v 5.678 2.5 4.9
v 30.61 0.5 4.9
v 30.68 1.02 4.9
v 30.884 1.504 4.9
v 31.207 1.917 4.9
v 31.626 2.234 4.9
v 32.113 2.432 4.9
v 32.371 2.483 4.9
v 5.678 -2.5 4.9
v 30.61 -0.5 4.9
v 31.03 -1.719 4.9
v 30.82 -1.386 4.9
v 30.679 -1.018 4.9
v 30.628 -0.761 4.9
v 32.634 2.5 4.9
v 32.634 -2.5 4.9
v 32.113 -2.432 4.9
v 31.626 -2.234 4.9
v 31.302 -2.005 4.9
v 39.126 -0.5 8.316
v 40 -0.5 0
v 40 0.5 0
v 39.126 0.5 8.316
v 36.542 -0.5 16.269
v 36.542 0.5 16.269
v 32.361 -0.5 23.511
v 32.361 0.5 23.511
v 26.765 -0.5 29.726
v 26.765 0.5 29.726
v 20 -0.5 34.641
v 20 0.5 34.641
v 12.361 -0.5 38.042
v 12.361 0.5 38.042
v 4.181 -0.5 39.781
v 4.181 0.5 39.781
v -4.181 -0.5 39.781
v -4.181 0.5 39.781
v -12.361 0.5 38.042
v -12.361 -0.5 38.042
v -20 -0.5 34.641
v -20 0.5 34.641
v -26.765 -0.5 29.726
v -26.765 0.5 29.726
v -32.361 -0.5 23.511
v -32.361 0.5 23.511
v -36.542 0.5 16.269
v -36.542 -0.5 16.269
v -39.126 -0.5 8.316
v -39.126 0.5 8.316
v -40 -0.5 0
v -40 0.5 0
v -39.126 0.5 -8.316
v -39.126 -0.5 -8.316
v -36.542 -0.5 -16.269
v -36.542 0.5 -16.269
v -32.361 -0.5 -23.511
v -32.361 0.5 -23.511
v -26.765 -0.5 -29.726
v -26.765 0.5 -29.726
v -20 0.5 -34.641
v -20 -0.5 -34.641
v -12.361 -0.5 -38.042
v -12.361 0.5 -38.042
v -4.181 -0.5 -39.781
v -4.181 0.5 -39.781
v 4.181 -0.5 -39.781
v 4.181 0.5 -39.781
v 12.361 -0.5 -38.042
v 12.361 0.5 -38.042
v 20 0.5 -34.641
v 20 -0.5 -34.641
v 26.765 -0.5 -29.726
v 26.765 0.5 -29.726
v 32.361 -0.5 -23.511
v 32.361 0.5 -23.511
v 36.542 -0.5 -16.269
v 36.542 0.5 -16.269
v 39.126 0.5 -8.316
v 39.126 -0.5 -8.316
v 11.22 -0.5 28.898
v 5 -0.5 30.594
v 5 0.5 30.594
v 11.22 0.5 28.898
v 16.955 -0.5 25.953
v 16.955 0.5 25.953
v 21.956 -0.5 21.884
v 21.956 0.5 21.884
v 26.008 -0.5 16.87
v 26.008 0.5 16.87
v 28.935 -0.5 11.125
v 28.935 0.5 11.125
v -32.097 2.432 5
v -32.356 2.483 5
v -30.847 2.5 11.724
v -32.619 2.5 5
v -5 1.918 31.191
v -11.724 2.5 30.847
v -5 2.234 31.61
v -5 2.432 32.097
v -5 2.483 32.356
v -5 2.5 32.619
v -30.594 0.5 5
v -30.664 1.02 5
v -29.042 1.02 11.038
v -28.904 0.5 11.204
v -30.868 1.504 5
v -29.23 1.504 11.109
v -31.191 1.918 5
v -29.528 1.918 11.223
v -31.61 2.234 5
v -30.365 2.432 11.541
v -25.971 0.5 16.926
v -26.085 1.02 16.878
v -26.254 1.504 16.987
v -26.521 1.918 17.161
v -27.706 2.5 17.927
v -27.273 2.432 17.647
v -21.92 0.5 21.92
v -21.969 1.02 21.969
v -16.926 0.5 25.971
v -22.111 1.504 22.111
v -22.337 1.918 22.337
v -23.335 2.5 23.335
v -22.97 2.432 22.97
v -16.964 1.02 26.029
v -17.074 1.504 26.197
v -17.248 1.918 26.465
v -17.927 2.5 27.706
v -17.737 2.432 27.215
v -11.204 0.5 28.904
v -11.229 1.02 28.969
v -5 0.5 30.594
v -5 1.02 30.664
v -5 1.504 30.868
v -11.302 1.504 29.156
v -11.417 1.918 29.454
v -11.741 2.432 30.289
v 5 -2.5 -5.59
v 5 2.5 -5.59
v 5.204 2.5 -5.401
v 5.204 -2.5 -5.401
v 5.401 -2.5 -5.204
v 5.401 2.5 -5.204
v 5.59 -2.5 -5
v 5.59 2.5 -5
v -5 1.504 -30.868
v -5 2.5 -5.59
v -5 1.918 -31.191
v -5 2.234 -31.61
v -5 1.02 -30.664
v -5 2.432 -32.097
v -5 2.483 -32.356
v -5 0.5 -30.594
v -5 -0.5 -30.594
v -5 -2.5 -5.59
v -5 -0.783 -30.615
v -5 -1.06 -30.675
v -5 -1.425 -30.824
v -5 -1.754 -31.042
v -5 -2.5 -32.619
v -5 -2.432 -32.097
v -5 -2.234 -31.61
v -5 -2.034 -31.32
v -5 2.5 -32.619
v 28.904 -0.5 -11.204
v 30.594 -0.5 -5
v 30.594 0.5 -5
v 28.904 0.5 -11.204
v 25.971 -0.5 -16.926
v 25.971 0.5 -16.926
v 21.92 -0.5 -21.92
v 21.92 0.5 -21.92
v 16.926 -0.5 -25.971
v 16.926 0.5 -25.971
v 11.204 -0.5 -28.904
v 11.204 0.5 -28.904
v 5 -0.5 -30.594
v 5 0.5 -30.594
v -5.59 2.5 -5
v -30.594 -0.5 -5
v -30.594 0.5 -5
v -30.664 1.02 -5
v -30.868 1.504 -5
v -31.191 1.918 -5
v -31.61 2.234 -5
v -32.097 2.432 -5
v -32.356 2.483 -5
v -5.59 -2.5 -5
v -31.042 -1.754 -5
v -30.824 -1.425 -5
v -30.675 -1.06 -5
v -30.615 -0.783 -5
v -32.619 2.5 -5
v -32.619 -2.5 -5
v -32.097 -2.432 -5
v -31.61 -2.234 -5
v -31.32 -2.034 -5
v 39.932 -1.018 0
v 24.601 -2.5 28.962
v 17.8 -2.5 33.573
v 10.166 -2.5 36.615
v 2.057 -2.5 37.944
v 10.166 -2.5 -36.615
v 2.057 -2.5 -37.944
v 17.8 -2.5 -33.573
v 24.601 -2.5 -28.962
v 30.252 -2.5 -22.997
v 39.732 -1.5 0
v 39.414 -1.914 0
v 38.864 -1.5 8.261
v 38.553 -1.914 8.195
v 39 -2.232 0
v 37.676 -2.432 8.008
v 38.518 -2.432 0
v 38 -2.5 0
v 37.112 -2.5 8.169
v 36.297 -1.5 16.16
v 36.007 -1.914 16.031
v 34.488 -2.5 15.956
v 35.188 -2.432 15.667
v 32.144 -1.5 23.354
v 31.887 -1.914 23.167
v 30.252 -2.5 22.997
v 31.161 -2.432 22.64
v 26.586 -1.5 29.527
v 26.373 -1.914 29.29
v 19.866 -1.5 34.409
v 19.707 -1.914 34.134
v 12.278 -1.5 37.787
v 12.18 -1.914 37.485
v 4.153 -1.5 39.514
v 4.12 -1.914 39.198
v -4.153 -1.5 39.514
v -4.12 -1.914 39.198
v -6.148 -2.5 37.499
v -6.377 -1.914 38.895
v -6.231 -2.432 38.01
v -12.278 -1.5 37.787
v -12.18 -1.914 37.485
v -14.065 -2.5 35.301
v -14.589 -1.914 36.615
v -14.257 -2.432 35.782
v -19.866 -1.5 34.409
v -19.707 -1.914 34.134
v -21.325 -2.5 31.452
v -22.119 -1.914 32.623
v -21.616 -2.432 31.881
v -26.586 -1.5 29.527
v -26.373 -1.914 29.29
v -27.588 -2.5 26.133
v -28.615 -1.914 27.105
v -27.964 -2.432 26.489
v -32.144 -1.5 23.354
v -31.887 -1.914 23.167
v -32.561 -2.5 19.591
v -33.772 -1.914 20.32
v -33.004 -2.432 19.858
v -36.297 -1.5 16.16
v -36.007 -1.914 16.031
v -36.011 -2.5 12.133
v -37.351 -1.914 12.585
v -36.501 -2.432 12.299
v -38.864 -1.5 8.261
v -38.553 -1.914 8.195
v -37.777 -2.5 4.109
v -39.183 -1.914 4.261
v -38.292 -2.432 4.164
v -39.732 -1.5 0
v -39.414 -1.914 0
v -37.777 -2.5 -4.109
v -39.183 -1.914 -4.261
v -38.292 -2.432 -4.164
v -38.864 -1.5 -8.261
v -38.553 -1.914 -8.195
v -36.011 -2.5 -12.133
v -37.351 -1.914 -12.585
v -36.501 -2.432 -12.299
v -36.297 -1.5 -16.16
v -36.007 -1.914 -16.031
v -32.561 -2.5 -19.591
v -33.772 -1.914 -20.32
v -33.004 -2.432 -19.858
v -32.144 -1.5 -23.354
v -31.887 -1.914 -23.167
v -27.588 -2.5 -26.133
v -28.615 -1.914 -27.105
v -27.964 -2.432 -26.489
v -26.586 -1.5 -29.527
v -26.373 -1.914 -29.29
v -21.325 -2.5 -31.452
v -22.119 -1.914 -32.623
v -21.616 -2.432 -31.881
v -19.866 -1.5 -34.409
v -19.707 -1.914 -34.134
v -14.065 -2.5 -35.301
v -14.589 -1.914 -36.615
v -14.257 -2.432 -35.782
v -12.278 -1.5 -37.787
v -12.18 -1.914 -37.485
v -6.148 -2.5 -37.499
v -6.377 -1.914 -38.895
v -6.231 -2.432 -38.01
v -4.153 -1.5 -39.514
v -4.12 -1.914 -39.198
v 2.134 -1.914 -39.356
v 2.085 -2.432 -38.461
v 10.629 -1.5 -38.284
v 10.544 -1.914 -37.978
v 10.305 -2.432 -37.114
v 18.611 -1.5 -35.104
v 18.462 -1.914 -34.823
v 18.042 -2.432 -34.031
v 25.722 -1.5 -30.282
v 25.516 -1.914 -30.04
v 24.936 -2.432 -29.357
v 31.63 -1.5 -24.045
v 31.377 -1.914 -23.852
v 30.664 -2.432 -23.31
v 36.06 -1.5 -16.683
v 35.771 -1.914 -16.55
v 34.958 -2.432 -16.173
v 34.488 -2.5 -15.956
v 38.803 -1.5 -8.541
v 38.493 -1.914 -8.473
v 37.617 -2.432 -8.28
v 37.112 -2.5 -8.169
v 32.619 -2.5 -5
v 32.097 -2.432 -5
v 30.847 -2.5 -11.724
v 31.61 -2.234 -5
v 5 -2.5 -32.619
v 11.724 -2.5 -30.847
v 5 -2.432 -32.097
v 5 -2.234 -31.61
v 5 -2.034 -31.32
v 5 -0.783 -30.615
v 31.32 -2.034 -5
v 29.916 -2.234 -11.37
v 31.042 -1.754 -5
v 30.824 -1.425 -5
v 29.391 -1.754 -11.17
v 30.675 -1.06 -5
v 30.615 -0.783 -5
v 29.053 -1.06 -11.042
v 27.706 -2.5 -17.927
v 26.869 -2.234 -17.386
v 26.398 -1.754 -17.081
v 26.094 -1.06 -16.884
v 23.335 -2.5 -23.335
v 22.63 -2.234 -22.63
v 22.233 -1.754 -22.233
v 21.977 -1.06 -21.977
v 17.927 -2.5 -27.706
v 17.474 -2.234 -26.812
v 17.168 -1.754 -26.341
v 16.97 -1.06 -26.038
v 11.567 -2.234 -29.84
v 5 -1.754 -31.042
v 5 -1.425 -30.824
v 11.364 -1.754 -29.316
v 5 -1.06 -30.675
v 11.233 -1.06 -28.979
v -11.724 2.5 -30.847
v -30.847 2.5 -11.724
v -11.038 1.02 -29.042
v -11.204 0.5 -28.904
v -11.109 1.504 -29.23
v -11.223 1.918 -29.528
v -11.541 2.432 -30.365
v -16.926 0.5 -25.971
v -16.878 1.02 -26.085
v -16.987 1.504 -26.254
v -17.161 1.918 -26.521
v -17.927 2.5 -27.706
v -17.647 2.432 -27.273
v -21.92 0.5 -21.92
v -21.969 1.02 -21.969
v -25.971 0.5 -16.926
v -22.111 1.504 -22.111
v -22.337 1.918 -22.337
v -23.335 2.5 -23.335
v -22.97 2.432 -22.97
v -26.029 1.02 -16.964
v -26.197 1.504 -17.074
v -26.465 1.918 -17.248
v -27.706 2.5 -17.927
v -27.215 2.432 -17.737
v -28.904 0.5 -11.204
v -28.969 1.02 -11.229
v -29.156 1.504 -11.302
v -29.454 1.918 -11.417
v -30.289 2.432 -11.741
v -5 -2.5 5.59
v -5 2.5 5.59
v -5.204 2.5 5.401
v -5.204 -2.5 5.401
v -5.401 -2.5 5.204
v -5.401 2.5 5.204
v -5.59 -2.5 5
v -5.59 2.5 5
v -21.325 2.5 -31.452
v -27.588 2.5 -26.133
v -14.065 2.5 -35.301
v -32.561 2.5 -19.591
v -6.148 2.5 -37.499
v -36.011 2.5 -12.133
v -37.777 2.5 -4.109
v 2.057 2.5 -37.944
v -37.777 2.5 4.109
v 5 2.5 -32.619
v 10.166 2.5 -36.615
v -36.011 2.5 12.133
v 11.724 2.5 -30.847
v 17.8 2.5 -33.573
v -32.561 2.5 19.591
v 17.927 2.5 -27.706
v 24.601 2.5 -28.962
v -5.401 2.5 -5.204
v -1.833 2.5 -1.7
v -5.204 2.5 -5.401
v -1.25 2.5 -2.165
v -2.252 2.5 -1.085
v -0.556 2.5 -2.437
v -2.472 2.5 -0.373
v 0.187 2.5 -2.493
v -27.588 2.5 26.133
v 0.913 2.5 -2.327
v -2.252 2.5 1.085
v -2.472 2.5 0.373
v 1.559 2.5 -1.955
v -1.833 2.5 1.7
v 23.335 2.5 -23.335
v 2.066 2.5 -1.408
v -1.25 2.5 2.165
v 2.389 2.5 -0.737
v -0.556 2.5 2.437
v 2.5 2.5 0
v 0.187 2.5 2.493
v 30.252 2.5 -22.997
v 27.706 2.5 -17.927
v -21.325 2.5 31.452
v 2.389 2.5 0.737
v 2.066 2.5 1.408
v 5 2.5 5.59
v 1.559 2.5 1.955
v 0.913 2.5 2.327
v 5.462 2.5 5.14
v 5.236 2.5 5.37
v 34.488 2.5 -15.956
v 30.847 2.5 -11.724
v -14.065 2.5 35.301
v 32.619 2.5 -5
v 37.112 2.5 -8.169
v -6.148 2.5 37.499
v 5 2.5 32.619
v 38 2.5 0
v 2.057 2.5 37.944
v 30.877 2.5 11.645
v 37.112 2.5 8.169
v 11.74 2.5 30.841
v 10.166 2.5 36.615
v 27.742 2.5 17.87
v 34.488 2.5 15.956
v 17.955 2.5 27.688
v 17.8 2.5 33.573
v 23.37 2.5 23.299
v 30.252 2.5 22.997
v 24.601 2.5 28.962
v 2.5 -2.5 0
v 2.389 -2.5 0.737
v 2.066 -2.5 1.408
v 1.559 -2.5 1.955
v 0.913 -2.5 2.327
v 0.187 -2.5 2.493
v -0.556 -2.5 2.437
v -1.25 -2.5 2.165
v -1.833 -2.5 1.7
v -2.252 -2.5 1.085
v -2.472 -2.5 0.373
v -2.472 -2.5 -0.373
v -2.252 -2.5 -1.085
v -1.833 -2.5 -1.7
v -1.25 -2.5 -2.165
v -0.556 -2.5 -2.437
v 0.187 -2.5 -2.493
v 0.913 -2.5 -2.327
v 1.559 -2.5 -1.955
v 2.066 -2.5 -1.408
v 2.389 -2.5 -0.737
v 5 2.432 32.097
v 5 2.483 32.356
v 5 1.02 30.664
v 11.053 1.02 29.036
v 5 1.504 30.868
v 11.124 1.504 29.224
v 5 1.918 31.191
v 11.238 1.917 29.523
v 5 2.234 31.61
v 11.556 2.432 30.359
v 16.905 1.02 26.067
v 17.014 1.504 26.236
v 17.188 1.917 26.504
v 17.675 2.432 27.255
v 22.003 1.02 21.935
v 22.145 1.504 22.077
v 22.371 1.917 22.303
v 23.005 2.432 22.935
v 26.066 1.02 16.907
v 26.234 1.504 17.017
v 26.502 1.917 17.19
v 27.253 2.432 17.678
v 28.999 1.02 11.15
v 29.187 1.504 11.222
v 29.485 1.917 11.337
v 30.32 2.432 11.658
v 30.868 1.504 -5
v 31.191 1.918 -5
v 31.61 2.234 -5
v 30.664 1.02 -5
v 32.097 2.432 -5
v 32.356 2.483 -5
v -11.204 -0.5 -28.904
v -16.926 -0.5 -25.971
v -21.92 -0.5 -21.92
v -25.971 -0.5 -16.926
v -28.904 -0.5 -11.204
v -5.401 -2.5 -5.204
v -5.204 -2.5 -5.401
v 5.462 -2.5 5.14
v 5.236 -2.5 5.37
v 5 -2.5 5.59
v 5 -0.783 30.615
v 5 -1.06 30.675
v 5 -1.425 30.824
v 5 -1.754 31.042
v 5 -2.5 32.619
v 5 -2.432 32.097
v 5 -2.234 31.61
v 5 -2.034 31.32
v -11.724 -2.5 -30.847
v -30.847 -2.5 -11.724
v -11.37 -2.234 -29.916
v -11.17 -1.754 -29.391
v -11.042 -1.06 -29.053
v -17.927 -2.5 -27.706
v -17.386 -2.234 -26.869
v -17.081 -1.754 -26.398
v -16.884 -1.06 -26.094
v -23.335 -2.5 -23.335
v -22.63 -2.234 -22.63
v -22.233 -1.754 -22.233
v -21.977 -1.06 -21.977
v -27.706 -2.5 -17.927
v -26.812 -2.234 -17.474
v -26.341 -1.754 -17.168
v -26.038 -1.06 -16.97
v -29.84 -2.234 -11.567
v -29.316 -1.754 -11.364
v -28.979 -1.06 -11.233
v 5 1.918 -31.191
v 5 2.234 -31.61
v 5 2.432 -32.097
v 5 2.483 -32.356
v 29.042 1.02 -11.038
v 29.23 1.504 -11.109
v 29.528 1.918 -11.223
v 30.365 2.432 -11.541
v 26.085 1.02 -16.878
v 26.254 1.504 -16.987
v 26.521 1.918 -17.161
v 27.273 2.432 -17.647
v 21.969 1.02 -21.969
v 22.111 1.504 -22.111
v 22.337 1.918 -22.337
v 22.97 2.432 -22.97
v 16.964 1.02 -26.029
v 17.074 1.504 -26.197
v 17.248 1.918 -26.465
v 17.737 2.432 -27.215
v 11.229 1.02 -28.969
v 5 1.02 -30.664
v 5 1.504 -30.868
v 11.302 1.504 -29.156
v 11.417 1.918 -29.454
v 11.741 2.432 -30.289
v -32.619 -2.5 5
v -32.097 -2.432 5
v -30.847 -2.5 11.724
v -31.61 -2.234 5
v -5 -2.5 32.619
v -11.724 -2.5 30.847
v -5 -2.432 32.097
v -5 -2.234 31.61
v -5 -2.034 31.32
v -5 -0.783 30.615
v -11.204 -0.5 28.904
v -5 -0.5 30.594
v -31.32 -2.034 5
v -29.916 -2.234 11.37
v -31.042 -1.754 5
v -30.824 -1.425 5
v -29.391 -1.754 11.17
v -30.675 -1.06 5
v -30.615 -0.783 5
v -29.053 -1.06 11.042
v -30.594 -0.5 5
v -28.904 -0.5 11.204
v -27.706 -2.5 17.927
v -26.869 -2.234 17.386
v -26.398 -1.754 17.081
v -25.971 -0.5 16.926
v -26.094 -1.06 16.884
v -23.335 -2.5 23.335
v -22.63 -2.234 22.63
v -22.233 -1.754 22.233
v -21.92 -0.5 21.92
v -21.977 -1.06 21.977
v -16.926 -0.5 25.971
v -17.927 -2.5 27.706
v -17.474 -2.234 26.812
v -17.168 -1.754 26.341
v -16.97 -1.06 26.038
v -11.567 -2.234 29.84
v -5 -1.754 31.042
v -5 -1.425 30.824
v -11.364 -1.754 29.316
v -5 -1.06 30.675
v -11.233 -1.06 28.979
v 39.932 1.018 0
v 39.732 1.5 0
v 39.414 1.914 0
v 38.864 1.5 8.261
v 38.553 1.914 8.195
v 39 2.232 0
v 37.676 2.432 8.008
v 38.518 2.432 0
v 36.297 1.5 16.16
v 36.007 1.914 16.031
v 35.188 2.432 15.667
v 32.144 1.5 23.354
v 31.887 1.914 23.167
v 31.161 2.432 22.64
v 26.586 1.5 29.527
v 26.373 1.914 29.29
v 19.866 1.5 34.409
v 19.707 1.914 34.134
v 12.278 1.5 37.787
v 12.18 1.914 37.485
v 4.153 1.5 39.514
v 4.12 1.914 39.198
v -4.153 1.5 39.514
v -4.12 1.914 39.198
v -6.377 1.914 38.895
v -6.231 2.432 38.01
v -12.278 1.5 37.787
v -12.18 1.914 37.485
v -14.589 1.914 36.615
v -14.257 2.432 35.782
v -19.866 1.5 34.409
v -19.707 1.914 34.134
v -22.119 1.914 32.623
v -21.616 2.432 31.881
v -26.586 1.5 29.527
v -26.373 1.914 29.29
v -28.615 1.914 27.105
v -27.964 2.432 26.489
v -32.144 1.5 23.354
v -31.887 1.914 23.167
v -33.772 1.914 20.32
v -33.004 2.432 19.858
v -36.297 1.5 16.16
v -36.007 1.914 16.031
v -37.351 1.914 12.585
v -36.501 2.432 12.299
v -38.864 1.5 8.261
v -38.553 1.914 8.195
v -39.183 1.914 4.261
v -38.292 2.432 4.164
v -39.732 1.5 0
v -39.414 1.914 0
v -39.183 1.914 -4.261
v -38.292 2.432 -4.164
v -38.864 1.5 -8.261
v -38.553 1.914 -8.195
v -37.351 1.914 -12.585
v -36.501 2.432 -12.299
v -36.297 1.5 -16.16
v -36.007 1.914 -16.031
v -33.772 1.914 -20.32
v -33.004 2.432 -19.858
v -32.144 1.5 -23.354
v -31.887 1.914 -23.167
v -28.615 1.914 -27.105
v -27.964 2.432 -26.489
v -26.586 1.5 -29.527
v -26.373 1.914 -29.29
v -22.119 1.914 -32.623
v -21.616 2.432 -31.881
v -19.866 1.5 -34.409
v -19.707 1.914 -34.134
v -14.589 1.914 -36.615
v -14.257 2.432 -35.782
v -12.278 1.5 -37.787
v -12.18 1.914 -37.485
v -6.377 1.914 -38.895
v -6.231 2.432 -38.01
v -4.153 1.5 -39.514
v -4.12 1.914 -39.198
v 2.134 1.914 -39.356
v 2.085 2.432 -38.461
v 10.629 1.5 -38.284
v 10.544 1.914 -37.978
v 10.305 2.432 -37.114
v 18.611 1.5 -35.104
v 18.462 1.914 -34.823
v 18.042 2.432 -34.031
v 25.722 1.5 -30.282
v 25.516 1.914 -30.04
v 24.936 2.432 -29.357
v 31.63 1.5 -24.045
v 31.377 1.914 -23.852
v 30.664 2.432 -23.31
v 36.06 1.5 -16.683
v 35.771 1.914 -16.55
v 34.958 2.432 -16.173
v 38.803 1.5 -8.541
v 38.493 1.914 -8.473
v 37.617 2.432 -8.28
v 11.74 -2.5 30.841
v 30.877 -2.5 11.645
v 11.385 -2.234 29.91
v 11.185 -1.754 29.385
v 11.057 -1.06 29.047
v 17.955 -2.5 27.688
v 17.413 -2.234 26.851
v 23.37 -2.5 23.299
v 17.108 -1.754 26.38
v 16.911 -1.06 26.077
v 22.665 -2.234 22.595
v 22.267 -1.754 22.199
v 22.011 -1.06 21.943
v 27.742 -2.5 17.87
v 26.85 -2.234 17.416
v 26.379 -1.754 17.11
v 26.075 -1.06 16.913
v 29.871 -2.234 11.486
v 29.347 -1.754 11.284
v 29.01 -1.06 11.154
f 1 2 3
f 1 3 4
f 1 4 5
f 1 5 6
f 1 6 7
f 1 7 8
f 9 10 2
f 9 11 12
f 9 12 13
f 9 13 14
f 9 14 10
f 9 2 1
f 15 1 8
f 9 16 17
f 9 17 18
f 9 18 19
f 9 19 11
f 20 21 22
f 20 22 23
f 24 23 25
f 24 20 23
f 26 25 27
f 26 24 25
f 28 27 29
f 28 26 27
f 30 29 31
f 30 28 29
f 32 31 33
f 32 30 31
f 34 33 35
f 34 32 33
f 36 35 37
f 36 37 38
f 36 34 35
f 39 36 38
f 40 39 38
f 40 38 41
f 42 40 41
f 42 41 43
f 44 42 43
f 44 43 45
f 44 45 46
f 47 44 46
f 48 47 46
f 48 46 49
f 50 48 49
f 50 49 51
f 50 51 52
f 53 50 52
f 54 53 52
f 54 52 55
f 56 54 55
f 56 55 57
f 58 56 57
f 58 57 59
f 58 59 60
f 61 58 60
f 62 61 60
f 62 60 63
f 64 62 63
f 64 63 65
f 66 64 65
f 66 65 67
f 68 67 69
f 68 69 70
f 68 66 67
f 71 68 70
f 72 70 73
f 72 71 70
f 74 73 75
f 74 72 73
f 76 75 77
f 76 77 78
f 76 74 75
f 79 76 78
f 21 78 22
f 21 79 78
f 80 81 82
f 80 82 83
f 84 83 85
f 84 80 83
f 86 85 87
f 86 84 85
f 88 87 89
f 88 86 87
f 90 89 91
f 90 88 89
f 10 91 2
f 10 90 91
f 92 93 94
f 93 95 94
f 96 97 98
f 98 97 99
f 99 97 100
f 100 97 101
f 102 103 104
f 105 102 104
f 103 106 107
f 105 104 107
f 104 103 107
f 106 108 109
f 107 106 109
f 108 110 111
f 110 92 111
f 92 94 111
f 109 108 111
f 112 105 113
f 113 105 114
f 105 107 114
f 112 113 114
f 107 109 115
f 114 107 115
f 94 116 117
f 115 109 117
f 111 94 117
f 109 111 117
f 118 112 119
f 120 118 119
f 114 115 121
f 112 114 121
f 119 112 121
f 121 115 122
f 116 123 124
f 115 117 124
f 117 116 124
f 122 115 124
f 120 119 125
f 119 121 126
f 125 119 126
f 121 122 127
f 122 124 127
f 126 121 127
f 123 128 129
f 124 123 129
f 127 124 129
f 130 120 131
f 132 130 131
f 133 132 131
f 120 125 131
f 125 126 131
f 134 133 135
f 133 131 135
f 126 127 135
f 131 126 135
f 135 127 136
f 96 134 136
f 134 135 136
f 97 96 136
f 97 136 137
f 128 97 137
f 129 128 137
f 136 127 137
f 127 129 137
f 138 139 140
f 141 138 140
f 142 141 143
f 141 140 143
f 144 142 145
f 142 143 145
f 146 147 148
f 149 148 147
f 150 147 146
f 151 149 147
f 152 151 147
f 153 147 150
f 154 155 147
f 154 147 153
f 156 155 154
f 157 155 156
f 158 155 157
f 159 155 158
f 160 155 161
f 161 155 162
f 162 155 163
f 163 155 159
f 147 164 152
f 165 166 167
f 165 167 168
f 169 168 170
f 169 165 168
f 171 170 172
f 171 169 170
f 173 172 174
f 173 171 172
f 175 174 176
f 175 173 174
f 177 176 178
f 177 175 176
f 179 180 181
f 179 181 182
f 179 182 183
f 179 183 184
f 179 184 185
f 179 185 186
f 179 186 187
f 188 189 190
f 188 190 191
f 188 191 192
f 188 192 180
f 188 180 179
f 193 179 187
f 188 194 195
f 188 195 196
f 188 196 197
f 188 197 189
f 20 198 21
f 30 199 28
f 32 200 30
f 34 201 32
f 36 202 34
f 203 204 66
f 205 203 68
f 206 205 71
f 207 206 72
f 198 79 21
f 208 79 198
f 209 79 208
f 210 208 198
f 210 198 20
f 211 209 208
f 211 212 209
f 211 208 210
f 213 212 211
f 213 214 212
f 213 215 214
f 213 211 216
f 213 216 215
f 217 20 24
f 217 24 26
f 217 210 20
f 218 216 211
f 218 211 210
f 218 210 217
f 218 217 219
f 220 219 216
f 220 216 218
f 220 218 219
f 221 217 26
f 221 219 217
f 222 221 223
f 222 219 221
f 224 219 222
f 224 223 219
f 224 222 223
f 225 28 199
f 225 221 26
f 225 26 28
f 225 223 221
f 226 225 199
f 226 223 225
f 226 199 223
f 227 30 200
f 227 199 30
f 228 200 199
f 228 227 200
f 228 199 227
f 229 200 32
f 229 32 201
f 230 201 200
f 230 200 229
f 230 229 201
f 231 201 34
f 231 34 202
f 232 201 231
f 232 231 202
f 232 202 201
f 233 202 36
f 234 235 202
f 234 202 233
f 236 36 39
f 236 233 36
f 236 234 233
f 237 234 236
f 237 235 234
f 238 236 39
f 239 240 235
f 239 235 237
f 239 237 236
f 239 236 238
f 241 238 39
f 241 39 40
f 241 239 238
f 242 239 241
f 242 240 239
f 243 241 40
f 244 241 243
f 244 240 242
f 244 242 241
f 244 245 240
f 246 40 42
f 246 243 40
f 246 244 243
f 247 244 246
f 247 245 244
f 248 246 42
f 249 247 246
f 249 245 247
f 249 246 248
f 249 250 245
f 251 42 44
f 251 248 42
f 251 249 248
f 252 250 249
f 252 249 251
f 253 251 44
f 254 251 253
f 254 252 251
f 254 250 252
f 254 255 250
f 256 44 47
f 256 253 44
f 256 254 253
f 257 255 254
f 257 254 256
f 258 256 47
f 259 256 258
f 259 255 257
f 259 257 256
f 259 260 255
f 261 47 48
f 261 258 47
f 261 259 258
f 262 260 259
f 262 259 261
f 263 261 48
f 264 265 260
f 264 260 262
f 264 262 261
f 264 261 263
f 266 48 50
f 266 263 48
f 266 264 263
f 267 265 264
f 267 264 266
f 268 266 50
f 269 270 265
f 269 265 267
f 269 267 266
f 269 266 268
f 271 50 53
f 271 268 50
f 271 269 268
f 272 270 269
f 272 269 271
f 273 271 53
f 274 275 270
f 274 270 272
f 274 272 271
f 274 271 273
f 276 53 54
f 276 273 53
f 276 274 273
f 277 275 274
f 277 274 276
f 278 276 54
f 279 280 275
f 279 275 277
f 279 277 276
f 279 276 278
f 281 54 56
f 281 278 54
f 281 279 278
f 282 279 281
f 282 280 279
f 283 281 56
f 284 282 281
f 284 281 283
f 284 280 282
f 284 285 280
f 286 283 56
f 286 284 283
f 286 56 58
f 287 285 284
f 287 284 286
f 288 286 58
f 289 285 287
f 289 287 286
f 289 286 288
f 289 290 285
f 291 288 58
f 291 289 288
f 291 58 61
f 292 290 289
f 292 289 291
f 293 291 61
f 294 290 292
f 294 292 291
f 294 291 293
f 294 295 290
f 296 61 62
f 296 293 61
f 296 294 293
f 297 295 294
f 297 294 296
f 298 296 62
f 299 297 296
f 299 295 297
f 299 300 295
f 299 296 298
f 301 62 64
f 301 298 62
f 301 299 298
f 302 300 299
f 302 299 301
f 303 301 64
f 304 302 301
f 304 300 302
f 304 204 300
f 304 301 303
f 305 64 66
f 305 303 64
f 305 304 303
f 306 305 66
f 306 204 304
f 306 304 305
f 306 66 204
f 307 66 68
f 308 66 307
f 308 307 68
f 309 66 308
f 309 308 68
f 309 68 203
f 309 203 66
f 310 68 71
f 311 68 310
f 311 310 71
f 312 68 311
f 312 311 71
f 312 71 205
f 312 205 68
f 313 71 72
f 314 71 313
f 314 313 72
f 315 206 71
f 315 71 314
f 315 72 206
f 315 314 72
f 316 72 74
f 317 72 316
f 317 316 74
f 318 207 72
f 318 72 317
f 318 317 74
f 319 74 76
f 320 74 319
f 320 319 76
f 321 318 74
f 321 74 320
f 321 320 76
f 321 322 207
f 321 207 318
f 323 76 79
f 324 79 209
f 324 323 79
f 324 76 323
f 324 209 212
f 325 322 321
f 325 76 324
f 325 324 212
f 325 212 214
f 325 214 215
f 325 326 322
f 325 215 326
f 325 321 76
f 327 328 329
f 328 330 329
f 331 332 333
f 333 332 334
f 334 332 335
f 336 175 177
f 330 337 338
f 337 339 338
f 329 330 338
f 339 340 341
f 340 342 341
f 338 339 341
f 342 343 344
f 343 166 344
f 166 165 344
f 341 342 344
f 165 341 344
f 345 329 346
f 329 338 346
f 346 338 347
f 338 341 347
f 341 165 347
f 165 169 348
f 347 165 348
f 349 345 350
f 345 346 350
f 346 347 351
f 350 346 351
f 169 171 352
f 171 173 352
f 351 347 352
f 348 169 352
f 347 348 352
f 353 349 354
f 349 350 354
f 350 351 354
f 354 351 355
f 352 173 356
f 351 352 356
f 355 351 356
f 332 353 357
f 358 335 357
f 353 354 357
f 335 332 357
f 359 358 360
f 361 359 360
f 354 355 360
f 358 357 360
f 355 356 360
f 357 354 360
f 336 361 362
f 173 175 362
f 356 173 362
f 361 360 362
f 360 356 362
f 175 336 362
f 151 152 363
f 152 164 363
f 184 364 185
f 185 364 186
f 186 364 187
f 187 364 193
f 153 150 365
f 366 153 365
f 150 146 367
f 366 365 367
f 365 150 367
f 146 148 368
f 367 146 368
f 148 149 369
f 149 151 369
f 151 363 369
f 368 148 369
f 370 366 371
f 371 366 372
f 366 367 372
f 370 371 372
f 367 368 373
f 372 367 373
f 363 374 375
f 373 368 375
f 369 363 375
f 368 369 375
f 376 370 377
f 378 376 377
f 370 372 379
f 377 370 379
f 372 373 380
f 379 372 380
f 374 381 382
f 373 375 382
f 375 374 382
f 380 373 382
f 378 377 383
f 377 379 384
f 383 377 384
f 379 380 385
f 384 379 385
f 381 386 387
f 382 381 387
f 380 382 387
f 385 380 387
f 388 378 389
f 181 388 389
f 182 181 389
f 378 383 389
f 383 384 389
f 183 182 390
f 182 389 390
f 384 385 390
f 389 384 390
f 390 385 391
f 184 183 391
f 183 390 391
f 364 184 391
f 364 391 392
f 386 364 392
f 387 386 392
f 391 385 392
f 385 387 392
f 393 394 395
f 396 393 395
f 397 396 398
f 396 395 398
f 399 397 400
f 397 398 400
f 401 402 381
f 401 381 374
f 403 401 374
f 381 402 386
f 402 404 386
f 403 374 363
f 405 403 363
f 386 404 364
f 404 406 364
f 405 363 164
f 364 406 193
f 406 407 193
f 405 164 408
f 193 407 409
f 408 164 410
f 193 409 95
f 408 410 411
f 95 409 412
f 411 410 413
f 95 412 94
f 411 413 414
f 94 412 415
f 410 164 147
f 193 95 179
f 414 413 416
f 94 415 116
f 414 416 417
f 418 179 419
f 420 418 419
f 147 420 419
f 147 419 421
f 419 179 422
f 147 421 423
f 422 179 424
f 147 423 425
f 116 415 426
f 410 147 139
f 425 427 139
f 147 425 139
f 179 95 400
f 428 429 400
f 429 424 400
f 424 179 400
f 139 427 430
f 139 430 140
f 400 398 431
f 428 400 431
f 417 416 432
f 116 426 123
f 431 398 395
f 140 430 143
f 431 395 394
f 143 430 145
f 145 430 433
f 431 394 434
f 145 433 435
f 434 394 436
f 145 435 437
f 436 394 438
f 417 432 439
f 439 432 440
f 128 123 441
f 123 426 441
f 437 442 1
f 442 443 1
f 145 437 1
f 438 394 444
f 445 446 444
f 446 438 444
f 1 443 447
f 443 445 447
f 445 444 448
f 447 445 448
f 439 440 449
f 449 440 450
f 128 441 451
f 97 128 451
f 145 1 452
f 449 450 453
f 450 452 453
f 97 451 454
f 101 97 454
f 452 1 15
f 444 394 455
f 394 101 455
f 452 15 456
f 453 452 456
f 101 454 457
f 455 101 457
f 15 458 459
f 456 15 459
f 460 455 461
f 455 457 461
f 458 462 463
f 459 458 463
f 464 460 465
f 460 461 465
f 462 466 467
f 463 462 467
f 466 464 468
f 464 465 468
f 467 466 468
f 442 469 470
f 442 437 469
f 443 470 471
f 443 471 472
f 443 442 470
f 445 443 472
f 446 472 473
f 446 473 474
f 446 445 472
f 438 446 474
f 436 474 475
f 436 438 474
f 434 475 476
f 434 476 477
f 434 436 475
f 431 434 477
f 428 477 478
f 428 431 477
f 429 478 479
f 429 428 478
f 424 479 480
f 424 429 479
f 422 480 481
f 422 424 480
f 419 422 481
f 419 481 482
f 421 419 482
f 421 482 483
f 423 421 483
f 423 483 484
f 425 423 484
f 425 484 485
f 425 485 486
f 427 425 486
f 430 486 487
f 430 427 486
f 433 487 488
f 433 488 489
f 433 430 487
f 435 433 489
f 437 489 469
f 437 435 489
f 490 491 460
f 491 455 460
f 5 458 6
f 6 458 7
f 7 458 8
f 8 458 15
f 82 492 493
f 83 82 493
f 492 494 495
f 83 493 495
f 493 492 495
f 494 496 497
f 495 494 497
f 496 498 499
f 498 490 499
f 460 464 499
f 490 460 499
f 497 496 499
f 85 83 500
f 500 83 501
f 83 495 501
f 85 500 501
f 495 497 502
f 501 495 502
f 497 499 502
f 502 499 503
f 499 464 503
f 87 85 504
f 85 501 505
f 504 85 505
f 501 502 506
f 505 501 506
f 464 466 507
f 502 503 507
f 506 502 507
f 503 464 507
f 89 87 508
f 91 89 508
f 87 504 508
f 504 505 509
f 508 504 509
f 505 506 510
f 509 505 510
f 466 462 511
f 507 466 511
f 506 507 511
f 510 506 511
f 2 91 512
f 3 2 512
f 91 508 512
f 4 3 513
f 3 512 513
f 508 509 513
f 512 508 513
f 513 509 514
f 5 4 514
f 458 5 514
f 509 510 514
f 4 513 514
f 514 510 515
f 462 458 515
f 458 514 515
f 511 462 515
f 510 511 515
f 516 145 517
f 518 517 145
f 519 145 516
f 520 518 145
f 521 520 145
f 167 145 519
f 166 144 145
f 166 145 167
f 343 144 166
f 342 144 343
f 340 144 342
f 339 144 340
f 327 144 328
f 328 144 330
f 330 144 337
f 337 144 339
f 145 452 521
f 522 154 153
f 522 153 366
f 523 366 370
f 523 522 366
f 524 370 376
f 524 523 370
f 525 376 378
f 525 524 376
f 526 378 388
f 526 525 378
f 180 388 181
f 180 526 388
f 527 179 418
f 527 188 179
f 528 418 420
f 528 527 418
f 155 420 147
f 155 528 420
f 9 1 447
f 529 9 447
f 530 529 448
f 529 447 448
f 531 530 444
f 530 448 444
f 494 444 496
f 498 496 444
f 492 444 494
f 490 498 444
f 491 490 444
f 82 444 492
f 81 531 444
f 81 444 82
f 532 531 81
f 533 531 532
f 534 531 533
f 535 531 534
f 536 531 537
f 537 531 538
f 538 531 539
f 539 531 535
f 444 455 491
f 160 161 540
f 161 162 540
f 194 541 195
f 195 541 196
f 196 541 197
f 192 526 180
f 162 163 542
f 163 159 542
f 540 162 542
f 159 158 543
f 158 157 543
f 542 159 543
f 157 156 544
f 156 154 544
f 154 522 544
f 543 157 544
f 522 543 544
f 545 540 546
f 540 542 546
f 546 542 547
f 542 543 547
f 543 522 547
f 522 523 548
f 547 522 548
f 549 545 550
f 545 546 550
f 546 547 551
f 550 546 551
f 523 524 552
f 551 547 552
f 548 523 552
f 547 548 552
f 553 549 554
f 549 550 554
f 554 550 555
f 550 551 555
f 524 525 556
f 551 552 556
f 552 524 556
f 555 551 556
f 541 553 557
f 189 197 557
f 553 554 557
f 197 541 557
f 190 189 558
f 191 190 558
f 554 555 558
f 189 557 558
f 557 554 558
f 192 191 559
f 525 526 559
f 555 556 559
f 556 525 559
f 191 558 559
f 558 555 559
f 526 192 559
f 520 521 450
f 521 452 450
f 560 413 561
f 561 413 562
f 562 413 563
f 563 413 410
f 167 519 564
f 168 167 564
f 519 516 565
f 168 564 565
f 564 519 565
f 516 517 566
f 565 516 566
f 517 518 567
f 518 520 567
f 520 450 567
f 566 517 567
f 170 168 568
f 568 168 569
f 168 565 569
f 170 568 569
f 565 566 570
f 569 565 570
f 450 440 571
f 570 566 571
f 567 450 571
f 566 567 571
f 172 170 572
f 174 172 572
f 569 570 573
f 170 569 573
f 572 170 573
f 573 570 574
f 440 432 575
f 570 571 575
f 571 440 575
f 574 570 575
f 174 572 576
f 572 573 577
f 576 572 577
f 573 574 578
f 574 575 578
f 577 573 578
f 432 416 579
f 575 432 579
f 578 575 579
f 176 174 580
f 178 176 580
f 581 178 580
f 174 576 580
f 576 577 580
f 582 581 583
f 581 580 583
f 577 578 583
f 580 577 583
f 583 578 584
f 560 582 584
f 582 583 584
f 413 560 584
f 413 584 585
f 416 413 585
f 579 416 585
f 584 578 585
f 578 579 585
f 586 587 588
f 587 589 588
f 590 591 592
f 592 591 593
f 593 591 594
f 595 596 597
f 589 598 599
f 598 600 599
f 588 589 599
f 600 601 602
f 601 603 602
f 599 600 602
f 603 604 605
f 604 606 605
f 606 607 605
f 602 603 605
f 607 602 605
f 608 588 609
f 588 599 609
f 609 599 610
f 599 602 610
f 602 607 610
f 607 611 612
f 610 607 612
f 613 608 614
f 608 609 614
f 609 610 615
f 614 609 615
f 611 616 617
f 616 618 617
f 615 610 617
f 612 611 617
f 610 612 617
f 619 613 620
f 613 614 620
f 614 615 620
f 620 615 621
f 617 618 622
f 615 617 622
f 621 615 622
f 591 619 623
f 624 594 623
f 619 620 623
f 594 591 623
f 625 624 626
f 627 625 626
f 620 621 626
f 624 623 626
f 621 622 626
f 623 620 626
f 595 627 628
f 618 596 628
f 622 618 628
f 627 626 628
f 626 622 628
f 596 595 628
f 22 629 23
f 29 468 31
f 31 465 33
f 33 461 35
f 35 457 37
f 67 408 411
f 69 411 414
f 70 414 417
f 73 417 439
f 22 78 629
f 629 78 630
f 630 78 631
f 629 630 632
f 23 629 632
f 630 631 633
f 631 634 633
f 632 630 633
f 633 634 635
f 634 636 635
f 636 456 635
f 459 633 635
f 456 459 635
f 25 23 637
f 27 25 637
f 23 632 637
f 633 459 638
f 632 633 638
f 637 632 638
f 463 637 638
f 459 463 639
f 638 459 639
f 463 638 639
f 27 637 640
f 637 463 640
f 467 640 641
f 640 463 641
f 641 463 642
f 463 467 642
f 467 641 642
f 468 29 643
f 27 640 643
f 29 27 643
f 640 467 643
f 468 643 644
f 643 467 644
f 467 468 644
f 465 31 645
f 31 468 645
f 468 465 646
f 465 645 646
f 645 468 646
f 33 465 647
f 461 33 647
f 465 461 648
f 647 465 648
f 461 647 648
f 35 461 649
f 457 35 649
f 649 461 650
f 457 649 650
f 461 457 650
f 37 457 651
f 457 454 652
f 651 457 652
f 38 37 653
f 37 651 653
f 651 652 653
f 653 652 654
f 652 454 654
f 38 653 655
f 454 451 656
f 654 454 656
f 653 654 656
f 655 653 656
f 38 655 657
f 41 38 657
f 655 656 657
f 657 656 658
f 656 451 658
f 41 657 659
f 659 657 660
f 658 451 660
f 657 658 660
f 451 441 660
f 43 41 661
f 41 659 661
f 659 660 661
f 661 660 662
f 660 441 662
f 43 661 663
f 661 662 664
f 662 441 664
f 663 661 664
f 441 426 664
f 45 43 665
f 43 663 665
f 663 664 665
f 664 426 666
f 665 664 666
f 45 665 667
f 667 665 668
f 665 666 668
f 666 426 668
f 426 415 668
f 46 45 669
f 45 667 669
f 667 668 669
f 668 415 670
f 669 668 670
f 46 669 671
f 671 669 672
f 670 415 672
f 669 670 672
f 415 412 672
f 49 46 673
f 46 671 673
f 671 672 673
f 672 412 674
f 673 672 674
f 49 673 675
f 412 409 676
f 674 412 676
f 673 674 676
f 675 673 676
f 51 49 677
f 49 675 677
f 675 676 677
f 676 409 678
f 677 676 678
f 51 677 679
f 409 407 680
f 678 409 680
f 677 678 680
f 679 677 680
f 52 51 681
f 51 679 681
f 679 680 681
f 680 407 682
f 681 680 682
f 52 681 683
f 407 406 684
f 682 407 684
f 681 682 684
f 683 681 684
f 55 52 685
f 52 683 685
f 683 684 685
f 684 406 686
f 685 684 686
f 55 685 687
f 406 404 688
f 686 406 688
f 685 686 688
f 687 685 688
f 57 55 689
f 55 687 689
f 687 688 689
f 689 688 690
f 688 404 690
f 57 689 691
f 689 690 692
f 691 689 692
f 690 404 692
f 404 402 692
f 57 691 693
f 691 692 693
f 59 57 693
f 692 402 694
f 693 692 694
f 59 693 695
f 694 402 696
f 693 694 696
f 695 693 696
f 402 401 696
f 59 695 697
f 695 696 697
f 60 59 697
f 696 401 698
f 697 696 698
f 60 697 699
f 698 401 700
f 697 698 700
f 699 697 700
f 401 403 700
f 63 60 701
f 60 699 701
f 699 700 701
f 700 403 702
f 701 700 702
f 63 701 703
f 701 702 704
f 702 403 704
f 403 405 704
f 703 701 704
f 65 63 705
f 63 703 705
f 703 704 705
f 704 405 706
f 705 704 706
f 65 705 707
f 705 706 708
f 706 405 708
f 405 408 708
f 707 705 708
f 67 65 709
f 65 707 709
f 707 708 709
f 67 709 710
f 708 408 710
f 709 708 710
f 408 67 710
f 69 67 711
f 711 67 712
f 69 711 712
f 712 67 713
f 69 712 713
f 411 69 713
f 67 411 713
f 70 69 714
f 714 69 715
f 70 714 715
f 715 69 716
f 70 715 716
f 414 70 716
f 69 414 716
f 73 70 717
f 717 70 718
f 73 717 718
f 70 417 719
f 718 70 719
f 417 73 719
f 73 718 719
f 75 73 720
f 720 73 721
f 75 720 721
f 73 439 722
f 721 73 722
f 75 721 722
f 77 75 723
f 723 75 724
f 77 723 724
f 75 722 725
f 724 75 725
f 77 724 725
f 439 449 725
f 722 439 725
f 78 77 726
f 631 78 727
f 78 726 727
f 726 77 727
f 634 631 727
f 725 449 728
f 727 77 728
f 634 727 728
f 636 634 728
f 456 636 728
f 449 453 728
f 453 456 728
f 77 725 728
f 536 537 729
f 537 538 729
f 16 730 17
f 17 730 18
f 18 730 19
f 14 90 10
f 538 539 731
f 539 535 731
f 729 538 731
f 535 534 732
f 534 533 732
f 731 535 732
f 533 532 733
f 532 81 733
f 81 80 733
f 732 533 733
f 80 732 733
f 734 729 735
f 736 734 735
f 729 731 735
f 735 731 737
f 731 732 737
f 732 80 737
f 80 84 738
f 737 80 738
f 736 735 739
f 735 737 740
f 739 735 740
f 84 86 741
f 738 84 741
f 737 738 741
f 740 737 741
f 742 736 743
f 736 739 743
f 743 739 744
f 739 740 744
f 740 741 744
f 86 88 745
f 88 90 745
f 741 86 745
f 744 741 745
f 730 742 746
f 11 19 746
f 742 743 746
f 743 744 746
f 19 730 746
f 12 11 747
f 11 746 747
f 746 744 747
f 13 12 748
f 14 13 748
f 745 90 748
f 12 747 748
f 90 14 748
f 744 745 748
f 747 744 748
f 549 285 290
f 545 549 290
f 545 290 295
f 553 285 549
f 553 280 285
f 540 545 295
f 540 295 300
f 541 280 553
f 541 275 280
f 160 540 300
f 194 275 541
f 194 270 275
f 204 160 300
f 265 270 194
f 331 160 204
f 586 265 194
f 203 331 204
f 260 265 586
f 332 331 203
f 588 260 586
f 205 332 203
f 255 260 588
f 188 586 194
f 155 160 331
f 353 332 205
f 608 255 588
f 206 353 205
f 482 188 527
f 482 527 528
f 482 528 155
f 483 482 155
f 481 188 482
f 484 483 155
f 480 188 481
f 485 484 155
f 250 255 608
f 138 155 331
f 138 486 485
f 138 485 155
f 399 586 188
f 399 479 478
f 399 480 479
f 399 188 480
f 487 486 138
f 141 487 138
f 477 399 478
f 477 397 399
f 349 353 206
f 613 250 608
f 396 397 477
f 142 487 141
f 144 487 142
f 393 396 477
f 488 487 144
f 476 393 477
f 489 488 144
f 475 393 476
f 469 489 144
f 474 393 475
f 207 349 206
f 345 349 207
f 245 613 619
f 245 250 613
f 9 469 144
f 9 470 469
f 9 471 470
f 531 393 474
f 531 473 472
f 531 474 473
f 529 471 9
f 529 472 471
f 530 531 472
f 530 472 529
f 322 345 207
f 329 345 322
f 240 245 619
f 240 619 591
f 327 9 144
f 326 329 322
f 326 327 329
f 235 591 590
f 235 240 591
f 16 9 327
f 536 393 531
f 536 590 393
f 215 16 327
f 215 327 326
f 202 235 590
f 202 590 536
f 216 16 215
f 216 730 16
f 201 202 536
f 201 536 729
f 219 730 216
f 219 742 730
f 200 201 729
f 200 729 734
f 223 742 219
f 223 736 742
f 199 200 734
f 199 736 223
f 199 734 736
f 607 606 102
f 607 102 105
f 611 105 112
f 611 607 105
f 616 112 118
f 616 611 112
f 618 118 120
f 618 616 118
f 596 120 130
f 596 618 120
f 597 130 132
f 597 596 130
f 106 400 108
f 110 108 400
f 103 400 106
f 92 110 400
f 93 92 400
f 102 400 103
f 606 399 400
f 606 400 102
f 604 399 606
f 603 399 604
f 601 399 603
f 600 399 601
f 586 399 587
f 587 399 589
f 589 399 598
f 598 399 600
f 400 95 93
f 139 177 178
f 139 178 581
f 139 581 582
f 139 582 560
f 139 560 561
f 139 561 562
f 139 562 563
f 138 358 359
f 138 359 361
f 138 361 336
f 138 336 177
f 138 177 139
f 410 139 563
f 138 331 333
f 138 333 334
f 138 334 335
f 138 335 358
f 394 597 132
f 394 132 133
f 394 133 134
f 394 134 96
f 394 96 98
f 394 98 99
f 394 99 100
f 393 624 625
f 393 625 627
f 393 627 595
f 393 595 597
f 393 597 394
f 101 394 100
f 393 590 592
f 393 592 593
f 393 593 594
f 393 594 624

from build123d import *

# Parameters (mm, degrees)
F0_R     = 40
F0_R_2   = 2.5
F1_DEPTH = 2.5
F2_R     = 2


with BuildPart() as f1:
    # F0 (on Front) → F1 (new body, symmetric)
    with BuildSketch(Plane.XZ):
        Circle(F0_R)
        with BuildLine():
            ThreePointArc((-5, -30.594117), (-21.92031, -21.92031), (-30.594117, -5))
            Line((-30.594117, -5), (-5.59017, -5))
            ThreePointArc((-5.59017, -5), (-5.303301, -5.303301), (-5, -5.59017))
            Line((-5, -5.59017), (-5, -30.594117))
        make_face(mode=Mode.SUBTRACT)
        with BuildLine():
            Line((5, -30.594117), (5, -5.59017))
            ThreePointArc((5, -5.59017), (5.303301, -5.303301), (5.59017, -5))
            Line((5.59017, -5), (30.594117, -5))
            ThreePointArc((30.594117, -5), (21.92031, -21.92031), (5, -30.594117))
        make_face(mode=Mode.SUBTRACT)
        with BuildLine():
            Line((-5, 30.594117), (-5, 5.59017))
            ThreePointArc((-5, 5.59017), (-5.303301, 5.303301), (-5.59017, 5))
            Line((-5.59017, 5), (-30.594117, 5))
            ThreePointArc((-30.594117, 5), (-21.92031, 21.92031), (-5, 30.594117))
        make_face(mode=Mode.SUBTRACT)
        Circle(F0_R_2, mode=Mode.SUBTRACT)
        with BuildLine():
            ThreePointArc((5.678028, 4.9), (5.350154, 5.25603), (5, 5.59017))
            Line((5, 5.59017), (5, 30.594117))
            ThreePointArc((5, 30.594117), (21.956096, 21.884466), (30.610292, 4.9))
            Line((30.610292, 4.9), (5.678028, 4.9))
        make_face(mode=Mode.SUBTRACT)
    extrude(amount=F1_DEPTH, both=True)

    # F2
    f2_edges = [f1.edges().sort_by_distance(p)[0] for p in [
        (-40, 2.5, 0),
        (-40, -2.5, 0),
        (21.956096, 2.5, 21.884466),
        (-21.92031, 2.5, 21.92031),
        (21.92031, 2.5, -21.92031),
        (-21.92031, 2.5, -21.92031),
        (-21.92031, -2.5, 21.92031),
        (-21.92031, -2.5, -21.92031),
        (21.92031, -2.5, -21.92031),
        (21.956096, -2.5, 21.884466),
    ]]
    fillet(f2_edges, radius=F2_R)


solid = f1.part
